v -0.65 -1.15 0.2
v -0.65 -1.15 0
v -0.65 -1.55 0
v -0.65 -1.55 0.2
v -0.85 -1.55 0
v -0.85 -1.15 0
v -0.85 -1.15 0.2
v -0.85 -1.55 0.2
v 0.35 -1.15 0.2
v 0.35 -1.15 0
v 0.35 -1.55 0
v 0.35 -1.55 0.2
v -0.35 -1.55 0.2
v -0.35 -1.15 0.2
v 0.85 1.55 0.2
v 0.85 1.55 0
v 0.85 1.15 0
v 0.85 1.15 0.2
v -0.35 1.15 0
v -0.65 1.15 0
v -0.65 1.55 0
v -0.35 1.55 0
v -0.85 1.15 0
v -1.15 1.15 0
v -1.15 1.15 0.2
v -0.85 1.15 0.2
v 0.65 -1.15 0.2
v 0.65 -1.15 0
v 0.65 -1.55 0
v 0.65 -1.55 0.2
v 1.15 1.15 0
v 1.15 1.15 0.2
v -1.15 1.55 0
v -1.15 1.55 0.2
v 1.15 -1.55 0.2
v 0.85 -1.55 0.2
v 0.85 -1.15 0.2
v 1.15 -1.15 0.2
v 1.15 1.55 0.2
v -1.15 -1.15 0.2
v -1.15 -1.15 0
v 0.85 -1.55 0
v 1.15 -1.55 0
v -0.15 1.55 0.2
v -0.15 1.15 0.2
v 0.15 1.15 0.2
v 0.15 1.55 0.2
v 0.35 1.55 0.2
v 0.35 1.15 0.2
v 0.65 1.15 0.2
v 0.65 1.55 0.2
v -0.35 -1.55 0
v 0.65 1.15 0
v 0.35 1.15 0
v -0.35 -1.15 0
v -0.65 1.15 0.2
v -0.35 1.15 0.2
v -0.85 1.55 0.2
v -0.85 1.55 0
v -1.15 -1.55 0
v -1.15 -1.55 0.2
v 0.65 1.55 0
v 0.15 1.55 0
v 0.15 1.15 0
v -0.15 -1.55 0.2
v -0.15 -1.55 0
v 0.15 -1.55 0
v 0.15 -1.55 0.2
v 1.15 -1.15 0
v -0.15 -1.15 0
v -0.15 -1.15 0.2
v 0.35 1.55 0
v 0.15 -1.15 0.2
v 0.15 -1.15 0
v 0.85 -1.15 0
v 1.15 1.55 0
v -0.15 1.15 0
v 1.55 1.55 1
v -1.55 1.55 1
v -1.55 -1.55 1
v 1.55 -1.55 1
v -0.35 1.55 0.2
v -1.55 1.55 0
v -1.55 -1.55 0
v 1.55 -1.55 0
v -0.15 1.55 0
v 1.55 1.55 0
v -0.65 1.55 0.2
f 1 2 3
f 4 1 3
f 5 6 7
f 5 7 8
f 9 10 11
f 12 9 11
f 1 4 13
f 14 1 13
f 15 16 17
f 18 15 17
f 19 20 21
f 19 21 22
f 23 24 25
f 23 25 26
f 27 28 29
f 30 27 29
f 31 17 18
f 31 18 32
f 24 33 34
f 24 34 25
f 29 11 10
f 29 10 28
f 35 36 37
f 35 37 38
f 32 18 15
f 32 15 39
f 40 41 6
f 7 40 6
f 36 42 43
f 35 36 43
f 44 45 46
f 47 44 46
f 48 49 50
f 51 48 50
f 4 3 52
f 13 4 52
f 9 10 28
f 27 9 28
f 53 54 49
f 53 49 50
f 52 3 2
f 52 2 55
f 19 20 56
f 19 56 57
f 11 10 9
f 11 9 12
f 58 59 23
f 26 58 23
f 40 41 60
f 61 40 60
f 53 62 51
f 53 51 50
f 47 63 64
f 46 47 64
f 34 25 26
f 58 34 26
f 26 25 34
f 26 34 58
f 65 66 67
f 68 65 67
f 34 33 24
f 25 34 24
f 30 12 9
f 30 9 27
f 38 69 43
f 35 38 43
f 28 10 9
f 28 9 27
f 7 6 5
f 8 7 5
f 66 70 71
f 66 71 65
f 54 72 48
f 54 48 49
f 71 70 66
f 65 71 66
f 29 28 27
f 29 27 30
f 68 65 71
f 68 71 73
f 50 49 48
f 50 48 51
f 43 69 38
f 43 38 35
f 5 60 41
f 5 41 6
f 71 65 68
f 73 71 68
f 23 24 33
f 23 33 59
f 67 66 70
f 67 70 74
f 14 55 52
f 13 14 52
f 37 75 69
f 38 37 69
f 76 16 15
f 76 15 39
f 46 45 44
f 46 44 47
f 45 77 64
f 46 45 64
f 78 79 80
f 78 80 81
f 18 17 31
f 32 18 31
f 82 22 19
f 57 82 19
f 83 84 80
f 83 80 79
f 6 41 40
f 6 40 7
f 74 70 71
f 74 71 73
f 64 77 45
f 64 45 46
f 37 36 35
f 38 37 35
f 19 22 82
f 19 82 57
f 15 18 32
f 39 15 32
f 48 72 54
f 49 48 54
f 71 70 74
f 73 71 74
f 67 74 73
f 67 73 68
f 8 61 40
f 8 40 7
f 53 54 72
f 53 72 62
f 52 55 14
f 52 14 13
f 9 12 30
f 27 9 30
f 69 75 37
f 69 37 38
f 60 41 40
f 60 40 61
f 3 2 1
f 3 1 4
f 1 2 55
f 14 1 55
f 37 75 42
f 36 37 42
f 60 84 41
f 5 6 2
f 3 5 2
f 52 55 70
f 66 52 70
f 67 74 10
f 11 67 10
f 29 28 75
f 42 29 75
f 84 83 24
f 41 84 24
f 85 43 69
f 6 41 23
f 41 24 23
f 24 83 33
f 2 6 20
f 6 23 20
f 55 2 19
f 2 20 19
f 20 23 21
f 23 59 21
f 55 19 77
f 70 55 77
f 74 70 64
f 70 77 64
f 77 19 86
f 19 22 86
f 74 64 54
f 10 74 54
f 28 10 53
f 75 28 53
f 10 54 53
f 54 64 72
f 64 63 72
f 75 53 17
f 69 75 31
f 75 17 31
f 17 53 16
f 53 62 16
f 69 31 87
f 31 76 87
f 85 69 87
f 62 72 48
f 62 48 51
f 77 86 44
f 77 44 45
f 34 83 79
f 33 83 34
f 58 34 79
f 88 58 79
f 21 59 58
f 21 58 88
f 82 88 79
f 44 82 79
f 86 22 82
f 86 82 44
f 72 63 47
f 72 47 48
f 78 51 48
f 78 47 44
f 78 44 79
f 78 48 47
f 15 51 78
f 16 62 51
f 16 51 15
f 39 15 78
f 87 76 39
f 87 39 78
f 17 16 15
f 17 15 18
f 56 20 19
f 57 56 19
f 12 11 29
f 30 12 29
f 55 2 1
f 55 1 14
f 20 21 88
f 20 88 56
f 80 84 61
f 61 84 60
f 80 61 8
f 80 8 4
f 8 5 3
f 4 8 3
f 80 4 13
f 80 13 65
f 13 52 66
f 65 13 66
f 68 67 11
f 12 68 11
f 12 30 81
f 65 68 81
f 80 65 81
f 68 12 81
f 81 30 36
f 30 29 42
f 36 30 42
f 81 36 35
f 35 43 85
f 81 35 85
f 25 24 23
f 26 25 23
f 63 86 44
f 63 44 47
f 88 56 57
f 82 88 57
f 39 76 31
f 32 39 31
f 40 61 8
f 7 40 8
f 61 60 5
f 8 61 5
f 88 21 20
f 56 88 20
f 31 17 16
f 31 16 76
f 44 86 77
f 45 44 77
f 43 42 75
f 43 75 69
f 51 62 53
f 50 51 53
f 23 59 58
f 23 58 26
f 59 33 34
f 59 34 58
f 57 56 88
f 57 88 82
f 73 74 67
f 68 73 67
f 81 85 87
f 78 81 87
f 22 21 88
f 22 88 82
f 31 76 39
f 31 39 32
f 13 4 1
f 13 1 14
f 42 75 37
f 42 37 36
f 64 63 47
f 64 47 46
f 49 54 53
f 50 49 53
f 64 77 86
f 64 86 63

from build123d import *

# Parameters (mm, degrees)
F0_W     = 3.1
F0_H     = 3.1
F1_DEPTH = 1
F2_W     = 0.3
F2_H     = 0.4
F3_DEPTH = 0.2
F4_DEPTH = 0.2


with BuildPart() as f1:
    # F0 (on Top) → F1 (new body)
    with BuildSketch(Plane.XY):
        Rectangle(F0_W, F0_H)
    extrude(amount=F1_DEPTH)

    # F2 (on face) → F3 (cut)
    with BuildSketch(Plane(origin=(0, 0, 0), x_dir=(1, 0, 0), z_dir=(0, 0, -1))):
        with Locations((0, 1.35)):
            Rectangle(F2_W, F2_H)
        with Locations((0.5, 1.35)):
            Rectangle(F2_W, F2_H)
        with Locations((1, 1.35)):
            Rectangle(F2_W, F2_H)
        with Locations((-0.5, 1.35)):
            Rectangle(F2_W, F2_H)
        with Locations((-1, 1.35)):
            Rectangle(F2_W, F2_H)
        with Locations((0, -1.35)):
            Rectangle(F2_W, F2_H)
        with Locations((0.5, -1.35)):
            Rectangle(F2_W, F2_H)
        with Locations((-0.5, -1.35)):
            Rectangle(F2_W, F2_H)
        with Locations((1, -1.35)):
            Rectangle(F2_W, F2_H)
        with Locations((-1, -1.35)):
            Rectangle(F2_W, F2_H)
    extrude(amount=-F3_DEPTH, mode=Mode.SUBTRACT)


with BuildPart() as f4:
    # F2 (on face) → F4 (new body)
    with BuildSketch(Plane(origin=(0, 0, 0), x_dir=(1, 0, 0), z_dir=(0, 0, -1))):
        with Locations((0, 1.35)):
            Rectangle(F2_W, F2_H)
        with Locations((0.5, 1.35)):
            Rectangle(F2_W, F2_H)
        with Locations((1, 1.35)):
            Rectangle(F2_W, F2_H)
        with Locations((-0.5, 1.35)):
            Rectangle(F2_W, F2_H)
        with Locations((-1, 1.35)):
            Rectangle(F2_W, F2_H)
        with Locations((0, -1.35)):
            Rectangle(F2_W, F2_H)
        with Locations((0.5, -1.35)):
            Rectangle(F2_W, F2_H)
        with Locations((-0.5, -1.35)):
            Rectangle(F2_W, F2_H)
        with Locations((1, -1.35)):
            Rectangle(F2_W, F2_H)
        with Locations((-1, -1.35)):
            Rectangle(F2_W, F2_H)
    extrude(amount=-F4_DEPTH)


solid = Compound([f1.part, f4.part])
